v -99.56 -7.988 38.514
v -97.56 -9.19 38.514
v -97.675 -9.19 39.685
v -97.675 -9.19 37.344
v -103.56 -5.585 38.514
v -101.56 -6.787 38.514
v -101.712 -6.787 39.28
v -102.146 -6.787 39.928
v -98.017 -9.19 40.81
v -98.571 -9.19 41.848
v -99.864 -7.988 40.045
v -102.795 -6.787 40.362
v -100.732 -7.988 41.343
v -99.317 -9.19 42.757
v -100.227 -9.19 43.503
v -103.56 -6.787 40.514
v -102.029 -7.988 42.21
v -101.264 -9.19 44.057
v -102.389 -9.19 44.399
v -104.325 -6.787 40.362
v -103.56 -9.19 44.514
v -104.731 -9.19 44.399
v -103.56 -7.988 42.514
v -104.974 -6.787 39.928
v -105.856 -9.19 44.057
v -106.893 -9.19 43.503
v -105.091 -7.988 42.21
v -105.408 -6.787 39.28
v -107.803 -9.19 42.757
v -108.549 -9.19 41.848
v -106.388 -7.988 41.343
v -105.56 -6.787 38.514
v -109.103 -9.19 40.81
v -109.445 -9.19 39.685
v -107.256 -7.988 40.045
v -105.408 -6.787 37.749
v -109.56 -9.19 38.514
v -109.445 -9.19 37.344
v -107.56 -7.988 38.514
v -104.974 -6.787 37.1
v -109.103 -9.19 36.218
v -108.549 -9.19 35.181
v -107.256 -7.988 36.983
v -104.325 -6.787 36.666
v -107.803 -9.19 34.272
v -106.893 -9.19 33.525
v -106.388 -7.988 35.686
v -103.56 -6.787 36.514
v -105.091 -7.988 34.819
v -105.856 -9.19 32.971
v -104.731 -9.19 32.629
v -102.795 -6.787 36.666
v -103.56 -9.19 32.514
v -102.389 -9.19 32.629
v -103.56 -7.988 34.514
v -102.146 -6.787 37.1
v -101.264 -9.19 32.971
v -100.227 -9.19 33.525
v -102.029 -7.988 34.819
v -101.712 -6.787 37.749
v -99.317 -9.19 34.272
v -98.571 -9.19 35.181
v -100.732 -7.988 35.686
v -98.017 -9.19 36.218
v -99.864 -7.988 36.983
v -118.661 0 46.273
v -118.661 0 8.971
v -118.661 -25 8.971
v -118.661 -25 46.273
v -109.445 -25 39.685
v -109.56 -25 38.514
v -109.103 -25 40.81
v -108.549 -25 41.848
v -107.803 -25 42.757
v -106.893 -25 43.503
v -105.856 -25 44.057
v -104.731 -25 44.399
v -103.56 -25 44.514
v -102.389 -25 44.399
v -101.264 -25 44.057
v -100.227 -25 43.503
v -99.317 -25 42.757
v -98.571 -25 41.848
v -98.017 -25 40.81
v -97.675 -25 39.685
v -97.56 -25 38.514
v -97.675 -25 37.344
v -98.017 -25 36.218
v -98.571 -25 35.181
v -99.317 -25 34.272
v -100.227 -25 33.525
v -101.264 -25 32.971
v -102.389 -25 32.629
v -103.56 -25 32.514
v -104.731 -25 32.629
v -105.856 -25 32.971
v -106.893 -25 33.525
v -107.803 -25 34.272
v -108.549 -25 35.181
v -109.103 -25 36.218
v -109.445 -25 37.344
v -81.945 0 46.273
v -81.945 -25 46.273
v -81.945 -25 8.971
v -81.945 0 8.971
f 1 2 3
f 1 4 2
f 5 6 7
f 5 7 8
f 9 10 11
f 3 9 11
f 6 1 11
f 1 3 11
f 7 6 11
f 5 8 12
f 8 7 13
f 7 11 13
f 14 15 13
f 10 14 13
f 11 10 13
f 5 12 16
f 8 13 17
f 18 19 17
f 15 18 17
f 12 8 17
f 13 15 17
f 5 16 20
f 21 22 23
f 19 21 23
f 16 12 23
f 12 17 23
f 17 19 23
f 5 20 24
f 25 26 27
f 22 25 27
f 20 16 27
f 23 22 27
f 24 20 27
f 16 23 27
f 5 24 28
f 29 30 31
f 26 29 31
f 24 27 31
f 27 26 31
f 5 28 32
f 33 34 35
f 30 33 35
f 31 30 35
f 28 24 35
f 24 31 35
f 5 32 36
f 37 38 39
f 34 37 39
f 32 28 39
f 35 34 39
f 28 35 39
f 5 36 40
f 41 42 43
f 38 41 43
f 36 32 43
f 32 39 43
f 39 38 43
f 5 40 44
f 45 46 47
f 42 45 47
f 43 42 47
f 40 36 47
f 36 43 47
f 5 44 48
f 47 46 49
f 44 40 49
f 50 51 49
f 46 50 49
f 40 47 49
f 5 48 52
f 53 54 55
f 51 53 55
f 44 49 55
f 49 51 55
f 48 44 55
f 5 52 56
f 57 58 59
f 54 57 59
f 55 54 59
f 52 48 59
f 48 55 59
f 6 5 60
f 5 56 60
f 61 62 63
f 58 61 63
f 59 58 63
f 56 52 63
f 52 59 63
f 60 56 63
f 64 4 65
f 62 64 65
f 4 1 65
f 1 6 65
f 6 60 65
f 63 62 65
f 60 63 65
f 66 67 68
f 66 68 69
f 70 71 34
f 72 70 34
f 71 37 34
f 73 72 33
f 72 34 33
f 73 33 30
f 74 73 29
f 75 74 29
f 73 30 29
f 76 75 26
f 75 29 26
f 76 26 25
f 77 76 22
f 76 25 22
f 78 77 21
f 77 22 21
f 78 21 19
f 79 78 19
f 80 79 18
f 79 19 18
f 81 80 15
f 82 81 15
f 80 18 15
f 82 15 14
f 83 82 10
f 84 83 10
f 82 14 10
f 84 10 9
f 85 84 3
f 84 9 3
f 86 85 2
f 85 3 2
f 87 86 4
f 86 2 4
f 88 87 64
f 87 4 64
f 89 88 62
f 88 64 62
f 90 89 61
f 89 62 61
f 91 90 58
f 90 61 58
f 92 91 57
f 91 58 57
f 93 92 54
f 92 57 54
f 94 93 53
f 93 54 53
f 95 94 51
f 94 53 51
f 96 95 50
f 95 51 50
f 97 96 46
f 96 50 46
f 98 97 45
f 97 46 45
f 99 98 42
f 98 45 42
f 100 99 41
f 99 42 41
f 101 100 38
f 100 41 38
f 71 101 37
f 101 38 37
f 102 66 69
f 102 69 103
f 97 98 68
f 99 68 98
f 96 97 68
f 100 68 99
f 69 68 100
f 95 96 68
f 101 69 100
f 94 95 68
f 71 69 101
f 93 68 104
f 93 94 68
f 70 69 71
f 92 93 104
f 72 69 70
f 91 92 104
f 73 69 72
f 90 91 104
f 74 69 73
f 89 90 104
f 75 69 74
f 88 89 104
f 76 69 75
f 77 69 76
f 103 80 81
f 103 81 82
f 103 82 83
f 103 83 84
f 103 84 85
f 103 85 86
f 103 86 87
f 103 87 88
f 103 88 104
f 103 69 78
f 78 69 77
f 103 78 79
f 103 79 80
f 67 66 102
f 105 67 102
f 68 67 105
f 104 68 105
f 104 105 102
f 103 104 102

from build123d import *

# Parameters (mm, degrees)
F0_W     = 36.7165654898
F0_H     = 37.3021233827
F1_DEPTH = 25
F3_D     = 12
F3_DEPTH = 15.81
F3_TIP   = 3.6051637142


with BuildPart() as f1:
    # F0 (on Front) → F1 (new body)
    with BuildSketch(Plane.XZ):
        with Locations((-100.3030389547, 27.6219248772)):
            Rectangle(F0_W, F0_H)
    extrude(amount=F1_DEPTH)

    # F3
    with Locations(Plane.XZ.offset(25)):
        with Locations((-103.560000658, 38.5141521692)):
            Hole(F3_D / 2, depth=F3_DEPTH)
            with Locations((0, 0, -(F3_DEPTH + F3_TIP / 2))):  # 118° drill point
                Cone(0, F3_D / 2, F3_TIP, mode=Mode.SUBTRACT)


solid = f1.part
